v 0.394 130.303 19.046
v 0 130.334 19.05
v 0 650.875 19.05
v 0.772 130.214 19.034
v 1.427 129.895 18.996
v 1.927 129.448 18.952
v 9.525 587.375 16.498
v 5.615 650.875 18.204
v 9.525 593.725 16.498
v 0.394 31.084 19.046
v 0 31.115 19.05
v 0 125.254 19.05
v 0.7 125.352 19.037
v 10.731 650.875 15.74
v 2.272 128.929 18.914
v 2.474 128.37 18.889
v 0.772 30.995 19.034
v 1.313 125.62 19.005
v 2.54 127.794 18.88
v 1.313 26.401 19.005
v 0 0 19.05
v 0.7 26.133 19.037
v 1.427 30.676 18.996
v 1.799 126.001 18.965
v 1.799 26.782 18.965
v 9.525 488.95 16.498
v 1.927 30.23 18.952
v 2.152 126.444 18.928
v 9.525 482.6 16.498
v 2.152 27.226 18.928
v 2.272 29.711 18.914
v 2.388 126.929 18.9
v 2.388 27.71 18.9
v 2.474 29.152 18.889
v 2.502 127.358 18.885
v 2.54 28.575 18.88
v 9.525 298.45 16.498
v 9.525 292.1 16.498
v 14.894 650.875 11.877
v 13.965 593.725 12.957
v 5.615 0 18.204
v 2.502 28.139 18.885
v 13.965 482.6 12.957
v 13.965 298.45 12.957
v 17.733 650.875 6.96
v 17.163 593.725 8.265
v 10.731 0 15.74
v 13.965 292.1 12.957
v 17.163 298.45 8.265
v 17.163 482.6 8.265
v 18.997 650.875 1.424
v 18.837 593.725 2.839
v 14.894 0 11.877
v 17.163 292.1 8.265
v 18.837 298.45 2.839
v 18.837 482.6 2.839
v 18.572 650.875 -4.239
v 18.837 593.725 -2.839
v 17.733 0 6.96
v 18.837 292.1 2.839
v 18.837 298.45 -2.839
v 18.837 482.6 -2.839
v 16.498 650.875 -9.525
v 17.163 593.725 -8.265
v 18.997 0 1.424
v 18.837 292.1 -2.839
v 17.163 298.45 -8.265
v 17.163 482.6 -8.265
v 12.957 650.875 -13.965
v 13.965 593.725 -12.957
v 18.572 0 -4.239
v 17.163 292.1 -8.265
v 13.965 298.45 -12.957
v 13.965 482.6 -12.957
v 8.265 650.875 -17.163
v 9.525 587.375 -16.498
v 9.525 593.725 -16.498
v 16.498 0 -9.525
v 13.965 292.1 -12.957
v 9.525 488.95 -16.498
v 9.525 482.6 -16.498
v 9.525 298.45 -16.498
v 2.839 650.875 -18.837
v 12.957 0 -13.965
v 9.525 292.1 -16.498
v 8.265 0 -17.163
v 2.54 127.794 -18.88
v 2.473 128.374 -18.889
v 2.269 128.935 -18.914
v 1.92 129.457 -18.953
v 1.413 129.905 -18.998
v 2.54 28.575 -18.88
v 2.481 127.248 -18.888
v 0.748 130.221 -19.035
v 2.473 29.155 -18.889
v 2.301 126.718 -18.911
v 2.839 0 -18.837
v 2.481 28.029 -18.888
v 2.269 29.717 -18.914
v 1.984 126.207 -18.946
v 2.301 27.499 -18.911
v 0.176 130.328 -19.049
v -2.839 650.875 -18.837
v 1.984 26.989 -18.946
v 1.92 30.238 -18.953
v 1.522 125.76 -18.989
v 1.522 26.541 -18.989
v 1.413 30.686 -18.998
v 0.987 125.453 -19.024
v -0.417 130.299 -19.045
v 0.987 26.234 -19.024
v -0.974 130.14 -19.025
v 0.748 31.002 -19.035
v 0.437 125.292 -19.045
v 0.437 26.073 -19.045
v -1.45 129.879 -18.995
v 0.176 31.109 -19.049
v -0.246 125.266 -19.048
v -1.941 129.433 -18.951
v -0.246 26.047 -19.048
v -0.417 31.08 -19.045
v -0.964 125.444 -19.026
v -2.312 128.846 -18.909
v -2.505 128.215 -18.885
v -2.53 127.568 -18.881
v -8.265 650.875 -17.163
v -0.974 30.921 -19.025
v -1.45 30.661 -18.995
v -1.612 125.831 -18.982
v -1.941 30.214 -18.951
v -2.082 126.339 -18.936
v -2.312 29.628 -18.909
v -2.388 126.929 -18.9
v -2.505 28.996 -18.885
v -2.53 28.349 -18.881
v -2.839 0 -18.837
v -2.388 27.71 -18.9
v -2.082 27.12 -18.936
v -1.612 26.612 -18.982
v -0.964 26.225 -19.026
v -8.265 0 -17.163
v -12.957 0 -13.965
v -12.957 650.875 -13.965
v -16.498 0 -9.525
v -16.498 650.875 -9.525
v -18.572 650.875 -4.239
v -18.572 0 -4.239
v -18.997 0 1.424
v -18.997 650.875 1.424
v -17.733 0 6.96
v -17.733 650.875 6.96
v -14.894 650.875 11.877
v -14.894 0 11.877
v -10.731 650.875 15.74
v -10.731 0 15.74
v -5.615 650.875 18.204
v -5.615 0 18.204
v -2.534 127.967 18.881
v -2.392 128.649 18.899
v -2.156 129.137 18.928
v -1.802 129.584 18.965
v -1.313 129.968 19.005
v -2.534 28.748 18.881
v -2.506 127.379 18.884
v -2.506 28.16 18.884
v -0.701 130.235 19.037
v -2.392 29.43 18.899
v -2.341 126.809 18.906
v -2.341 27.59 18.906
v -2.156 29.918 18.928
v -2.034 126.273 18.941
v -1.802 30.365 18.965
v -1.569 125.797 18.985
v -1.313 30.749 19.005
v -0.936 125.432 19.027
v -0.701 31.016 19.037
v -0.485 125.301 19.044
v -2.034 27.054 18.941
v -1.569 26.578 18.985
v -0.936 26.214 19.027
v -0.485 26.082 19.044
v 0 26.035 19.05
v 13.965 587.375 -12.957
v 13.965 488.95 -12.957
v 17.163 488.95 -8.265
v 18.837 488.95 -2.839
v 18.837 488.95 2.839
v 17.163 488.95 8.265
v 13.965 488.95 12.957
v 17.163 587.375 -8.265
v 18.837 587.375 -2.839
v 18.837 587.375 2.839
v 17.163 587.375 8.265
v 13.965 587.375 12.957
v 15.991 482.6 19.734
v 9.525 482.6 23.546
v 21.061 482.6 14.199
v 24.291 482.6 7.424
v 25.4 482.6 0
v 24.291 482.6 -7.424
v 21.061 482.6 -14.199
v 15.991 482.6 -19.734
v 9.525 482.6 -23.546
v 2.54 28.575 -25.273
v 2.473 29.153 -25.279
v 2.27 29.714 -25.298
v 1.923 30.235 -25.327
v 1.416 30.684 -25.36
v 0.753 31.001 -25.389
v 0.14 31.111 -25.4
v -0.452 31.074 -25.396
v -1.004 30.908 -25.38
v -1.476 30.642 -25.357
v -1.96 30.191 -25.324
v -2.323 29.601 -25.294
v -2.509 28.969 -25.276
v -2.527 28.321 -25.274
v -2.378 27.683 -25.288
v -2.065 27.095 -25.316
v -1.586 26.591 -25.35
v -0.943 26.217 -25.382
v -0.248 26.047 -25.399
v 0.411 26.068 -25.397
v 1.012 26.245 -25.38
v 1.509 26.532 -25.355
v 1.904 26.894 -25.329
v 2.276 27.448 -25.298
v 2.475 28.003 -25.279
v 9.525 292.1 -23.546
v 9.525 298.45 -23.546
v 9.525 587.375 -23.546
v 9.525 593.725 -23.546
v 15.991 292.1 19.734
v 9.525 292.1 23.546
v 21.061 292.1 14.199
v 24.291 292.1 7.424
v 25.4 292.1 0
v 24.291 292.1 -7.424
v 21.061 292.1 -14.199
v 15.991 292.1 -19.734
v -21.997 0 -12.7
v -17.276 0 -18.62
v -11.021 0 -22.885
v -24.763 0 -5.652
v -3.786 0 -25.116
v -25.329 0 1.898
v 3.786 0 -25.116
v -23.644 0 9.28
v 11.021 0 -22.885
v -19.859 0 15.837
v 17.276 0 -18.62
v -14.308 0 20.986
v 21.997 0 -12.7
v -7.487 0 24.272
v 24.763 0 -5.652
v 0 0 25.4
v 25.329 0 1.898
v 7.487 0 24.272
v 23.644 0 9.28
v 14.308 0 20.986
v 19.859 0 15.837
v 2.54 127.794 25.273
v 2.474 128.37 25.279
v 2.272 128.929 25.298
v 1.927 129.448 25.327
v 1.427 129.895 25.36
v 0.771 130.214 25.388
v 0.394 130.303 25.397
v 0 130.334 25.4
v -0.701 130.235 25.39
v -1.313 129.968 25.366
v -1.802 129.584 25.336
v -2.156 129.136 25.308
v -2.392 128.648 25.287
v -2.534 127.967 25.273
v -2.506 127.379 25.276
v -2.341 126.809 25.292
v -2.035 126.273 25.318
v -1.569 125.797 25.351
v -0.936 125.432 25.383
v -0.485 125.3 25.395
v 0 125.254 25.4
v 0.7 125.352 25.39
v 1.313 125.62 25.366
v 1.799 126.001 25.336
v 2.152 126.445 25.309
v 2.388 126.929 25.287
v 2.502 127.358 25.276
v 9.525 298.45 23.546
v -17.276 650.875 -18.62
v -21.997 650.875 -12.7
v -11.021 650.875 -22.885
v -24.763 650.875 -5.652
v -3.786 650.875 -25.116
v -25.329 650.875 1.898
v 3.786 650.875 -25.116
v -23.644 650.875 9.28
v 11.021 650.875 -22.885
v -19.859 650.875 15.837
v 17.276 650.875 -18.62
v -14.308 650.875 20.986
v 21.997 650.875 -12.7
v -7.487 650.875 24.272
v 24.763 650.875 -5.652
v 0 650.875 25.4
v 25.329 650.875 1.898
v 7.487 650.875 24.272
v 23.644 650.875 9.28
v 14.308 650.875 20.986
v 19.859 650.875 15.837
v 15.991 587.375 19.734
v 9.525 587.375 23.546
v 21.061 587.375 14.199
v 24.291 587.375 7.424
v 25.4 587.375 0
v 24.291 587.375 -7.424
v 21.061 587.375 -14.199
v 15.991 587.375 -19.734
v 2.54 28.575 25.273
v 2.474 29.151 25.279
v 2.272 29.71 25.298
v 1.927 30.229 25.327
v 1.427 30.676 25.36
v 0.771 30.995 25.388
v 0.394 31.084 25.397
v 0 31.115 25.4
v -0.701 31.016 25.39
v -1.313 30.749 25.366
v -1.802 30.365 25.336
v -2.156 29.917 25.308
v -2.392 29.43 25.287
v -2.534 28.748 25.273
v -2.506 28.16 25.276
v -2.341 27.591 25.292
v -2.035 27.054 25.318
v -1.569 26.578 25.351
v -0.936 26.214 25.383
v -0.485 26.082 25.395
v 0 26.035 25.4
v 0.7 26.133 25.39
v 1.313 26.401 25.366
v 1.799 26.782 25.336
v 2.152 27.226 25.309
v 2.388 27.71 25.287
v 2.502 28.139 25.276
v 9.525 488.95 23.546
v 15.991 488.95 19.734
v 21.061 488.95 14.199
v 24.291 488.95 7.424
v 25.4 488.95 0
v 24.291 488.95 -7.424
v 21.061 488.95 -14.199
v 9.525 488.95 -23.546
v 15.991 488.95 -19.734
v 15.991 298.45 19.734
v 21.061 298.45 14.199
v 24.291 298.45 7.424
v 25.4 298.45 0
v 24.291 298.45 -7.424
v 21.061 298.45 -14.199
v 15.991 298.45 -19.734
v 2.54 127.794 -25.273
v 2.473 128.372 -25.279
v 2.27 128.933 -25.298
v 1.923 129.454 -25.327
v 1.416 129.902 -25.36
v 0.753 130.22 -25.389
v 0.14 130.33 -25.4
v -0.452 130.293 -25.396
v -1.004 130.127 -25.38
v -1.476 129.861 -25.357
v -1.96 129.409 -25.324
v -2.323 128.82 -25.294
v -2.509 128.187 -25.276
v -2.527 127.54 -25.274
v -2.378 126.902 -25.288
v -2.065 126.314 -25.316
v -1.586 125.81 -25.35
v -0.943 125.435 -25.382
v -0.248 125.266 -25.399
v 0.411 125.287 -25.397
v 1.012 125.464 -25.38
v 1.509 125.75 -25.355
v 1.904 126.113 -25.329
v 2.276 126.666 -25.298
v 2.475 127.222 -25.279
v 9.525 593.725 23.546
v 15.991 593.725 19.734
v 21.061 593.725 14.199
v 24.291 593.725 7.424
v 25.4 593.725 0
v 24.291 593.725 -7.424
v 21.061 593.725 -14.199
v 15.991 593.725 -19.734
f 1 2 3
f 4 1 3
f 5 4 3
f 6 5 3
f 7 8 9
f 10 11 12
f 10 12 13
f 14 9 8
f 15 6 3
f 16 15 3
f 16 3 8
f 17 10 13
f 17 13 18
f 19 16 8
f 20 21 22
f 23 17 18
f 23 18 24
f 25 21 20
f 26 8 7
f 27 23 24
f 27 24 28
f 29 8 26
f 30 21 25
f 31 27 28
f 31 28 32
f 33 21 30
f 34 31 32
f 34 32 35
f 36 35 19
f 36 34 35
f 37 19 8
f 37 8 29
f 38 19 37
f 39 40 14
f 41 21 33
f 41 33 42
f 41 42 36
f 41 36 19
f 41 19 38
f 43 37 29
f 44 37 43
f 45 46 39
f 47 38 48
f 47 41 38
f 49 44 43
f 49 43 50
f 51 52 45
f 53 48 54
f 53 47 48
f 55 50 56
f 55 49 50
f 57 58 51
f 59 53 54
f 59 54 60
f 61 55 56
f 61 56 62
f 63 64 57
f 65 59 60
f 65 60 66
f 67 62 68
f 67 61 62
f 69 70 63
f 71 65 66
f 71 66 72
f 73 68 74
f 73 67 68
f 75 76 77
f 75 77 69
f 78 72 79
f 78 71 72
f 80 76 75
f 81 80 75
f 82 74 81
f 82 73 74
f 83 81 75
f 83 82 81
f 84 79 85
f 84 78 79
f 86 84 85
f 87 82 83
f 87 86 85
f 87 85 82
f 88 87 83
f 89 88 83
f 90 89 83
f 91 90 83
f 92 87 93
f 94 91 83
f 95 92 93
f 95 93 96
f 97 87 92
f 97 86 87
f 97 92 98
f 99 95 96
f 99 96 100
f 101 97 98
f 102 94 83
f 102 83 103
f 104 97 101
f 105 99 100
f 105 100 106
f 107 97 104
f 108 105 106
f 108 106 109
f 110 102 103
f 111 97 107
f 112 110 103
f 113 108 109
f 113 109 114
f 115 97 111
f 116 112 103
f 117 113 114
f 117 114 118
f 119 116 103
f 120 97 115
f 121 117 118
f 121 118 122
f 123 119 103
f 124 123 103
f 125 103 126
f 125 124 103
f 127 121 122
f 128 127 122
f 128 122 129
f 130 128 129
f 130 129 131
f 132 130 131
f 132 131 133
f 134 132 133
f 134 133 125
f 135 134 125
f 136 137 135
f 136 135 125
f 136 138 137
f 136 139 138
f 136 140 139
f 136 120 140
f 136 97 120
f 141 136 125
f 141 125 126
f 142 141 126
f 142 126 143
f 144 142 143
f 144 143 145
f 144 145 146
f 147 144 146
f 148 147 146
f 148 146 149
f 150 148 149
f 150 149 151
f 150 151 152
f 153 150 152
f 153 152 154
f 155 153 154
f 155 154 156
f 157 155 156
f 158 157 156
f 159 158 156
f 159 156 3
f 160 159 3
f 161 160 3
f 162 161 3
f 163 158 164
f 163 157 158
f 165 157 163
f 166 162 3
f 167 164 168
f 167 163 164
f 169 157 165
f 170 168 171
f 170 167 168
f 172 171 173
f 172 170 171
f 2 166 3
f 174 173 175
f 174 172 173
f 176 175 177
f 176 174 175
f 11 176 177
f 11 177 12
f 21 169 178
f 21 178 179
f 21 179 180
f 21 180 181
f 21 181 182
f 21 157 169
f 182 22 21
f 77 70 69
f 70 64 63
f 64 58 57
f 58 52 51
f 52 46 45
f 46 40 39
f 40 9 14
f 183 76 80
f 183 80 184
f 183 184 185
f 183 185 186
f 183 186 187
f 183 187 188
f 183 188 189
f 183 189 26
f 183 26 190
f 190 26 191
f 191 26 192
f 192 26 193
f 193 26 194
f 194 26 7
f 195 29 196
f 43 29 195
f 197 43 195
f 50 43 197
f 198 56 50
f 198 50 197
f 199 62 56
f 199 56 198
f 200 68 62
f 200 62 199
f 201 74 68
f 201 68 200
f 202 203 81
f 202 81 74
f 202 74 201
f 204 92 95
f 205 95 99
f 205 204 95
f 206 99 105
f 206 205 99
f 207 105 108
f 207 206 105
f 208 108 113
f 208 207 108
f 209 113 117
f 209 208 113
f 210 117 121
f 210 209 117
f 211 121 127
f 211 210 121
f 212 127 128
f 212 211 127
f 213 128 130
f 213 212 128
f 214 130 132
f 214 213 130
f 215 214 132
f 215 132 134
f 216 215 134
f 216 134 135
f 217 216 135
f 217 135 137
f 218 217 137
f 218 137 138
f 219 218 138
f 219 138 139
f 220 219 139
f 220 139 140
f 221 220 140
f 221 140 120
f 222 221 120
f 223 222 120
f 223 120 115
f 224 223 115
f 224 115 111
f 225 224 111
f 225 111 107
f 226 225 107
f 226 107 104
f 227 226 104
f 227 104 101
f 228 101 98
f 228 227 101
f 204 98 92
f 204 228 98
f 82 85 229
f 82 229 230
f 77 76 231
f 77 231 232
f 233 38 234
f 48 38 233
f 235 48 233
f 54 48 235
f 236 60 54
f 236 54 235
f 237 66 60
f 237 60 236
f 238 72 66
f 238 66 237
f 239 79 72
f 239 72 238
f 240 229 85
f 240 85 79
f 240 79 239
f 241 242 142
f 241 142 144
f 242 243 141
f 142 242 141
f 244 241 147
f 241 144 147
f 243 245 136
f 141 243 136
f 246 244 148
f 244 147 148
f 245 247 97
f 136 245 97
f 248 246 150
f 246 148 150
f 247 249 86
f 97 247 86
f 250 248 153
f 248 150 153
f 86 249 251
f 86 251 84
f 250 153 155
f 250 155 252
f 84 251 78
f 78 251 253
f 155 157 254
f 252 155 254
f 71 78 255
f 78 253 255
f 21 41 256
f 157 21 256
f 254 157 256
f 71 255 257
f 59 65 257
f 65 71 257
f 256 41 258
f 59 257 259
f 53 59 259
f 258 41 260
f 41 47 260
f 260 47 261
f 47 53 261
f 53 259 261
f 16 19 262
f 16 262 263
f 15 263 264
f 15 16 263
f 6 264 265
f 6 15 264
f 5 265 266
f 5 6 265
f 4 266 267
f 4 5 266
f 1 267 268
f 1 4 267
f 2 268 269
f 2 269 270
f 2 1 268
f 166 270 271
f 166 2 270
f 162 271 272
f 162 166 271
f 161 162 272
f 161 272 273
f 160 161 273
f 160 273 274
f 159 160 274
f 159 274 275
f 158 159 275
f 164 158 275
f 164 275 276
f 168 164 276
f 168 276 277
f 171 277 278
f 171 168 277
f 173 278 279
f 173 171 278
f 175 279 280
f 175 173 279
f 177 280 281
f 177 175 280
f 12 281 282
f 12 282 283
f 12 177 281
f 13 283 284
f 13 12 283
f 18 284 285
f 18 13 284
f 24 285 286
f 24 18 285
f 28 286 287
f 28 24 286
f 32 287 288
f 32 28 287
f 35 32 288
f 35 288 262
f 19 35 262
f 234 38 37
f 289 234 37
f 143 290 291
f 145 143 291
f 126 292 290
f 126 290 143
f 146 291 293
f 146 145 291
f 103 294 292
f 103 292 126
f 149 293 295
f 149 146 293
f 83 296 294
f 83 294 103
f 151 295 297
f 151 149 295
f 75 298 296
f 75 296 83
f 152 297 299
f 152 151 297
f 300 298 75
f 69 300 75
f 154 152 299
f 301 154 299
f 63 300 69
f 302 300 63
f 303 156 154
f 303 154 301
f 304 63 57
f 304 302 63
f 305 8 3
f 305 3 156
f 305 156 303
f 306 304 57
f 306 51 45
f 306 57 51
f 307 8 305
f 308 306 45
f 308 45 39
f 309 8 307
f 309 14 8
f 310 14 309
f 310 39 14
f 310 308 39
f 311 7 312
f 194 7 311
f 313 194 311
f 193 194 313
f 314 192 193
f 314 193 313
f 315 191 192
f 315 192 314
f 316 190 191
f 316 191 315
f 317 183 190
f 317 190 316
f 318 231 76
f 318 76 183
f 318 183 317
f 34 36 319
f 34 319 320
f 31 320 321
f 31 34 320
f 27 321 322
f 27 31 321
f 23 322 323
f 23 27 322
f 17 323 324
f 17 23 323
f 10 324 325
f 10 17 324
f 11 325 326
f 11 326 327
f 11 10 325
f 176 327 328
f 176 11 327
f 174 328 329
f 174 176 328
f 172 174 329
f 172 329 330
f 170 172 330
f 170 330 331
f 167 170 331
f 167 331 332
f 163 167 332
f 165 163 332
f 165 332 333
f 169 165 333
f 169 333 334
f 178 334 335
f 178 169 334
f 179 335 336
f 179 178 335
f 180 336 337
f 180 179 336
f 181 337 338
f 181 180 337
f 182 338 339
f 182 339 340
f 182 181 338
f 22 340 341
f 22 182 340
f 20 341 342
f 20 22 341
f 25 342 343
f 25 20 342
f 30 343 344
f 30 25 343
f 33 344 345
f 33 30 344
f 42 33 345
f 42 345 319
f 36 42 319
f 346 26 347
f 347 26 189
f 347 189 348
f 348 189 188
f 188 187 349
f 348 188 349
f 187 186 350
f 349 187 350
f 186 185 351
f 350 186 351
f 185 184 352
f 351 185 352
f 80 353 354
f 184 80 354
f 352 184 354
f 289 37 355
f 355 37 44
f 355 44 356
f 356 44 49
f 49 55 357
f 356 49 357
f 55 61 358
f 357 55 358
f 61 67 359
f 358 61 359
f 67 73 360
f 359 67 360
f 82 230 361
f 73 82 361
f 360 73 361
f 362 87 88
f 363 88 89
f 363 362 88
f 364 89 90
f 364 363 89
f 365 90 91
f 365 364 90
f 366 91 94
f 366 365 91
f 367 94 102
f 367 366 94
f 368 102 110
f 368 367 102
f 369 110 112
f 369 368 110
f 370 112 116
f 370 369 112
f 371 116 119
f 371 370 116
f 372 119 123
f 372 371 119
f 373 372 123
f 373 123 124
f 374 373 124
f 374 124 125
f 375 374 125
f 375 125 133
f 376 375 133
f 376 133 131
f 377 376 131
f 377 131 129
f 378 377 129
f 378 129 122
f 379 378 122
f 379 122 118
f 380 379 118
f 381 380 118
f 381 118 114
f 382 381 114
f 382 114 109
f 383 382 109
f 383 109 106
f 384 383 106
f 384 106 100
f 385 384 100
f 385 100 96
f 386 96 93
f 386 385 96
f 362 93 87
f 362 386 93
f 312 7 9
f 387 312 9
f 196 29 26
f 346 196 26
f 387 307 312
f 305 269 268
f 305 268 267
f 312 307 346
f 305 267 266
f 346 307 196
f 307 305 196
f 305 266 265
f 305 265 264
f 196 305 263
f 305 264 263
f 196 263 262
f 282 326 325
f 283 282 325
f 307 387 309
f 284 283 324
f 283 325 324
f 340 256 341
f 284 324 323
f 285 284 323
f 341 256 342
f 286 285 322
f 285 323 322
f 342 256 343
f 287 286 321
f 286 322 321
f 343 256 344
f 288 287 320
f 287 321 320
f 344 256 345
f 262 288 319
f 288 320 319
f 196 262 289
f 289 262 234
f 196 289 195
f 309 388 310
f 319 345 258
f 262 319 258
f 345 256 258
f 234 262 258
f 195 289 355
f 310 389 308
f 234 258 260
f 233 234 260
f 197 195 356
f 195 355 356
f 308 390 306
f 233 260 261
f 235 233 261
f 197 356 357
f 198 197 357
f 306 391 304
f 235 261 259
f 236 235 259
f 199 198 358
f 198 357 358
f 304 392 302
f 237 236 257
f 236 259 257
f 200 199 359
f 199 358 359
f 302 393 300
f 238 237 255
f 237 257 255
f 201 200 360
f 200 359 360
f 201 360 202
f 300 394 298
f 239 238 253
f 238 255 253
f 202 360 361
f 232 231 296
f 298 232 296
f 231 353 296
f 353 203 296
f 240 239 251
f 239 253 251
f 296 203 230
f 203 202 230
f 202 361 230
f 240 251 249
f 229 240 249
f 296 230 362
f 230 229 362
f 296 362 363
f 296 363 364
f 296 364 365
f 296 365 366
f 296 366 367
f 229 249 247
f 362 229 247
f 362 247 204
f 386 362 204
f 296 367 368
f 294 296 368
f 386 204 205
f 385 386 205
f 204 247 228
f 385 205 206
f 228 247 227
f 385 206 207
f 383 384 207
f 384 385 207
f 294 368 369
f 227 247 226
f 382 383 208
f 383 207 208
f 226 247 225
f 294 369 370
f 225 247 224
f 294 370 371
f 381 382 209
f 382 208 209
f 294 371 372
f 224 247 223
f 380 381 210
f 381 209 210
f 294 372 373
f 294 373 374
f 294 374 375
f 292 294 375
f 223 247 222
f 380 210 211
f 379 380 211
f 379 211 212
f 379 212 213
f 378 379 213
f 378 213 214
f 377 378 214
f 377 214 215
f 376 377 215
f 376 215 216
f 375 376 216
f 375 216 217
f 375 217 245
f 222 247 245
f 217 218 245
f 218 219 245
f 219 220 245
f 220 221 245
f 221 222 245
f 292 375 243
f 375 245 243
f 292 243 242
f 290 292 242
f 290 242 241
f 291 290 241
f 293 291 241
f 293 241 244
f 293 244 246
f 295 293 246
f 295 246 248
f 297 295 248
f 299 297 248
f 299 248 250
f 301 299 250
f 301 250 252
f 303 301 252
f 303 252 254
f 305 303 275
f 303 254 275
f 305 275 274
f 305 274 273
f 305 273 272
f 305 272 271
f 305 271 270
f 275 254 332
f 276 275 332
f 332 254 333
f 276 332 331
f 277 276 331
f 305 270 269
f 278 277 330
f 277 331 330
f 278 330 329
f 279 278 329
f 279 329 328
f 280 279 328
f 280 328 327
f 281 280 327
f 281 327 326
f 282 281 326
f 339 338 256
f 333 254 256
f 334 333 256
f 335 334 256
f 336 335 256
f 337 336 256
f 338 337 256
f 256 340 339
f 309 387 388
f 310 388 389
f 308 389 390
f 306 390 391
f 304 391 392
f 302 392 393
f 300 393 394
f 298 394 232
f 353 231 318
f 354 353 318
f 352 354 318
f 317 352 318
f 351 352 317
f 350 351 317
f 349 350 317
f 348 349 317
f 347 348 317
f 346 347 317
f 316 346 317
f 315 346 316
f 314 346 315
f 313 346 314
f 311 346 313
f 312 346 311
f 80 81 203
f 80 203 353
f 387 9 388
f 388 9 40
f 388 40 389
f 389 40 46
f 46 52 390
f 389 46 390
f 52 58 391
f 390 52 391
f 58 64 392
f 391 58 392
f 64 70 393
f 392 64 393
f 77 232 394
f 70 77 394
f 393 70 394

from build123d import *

# Parameters (mm, degrees)
SKETCH1_R               = 25.4
SKETCH1_R_2             = 19.05
BOSS_EXTRUDE1_DEPTH     = 650.875
CUT_EXTRUDE1_DEPTH      = 652.865465894
CUT_EXTRUDE1_DEPTH_BACK = 652.865465894
SKETCH2_R               = 2.54
SKETCH2_W               = 15.875
SKETCH2_H               = 6.35


with BuildPart() as part:
    # Sketch1 → Boss-Extrude1 (new body)
    with BuildSketch(Plane(origin=(0, 0, 0), x_dir=(1, 0, 0), z_dir=(0, 1, 0))):
        with Locations(Location((0, 0, 0), (0, 0, 270))):
            Circle(SKETCH1_R)
        with Locations(Location((0, 0, 0), (0, 0, 270))):
            Circle(SKETCH1_R_2, mode=Mode.SUBTRACT)
    extrude(amount=BOSS_EXTRUDE1_DEPTH)

    # Sketch2 → Cut-Extrude1 (cut, two sides: drawn at the far end of the back side and taken through both)
    with BuildSketch(Plane.XY.offset(-CUT_EXTRUDE1_DEPTH_BACK)):
        with Locations((0, 28.575)):
            Circle(SKETCH2_R)
        with Locations((0, 127.79375)):
            Circle(SKETCH2_R)
        with Locations((17.4625, 590.55)):
            Rectangle(SKETCH2_W, SKETCH2_H)
        with Locations((17.4625, 485.775)):
            Rectangle(SKETCH2_W, SKETCH2_H)
        with Locations((17.4625, 295.275)):
            Rectangle(SKETCH2_W, SKETCH2_H)
    extrude(amount=CUT_EXTRUDE1_DEPTH + CUT_EXTRUDE1_DEPTH_BACK, mode=Mode.SUBTRACT)


solid = part.part
